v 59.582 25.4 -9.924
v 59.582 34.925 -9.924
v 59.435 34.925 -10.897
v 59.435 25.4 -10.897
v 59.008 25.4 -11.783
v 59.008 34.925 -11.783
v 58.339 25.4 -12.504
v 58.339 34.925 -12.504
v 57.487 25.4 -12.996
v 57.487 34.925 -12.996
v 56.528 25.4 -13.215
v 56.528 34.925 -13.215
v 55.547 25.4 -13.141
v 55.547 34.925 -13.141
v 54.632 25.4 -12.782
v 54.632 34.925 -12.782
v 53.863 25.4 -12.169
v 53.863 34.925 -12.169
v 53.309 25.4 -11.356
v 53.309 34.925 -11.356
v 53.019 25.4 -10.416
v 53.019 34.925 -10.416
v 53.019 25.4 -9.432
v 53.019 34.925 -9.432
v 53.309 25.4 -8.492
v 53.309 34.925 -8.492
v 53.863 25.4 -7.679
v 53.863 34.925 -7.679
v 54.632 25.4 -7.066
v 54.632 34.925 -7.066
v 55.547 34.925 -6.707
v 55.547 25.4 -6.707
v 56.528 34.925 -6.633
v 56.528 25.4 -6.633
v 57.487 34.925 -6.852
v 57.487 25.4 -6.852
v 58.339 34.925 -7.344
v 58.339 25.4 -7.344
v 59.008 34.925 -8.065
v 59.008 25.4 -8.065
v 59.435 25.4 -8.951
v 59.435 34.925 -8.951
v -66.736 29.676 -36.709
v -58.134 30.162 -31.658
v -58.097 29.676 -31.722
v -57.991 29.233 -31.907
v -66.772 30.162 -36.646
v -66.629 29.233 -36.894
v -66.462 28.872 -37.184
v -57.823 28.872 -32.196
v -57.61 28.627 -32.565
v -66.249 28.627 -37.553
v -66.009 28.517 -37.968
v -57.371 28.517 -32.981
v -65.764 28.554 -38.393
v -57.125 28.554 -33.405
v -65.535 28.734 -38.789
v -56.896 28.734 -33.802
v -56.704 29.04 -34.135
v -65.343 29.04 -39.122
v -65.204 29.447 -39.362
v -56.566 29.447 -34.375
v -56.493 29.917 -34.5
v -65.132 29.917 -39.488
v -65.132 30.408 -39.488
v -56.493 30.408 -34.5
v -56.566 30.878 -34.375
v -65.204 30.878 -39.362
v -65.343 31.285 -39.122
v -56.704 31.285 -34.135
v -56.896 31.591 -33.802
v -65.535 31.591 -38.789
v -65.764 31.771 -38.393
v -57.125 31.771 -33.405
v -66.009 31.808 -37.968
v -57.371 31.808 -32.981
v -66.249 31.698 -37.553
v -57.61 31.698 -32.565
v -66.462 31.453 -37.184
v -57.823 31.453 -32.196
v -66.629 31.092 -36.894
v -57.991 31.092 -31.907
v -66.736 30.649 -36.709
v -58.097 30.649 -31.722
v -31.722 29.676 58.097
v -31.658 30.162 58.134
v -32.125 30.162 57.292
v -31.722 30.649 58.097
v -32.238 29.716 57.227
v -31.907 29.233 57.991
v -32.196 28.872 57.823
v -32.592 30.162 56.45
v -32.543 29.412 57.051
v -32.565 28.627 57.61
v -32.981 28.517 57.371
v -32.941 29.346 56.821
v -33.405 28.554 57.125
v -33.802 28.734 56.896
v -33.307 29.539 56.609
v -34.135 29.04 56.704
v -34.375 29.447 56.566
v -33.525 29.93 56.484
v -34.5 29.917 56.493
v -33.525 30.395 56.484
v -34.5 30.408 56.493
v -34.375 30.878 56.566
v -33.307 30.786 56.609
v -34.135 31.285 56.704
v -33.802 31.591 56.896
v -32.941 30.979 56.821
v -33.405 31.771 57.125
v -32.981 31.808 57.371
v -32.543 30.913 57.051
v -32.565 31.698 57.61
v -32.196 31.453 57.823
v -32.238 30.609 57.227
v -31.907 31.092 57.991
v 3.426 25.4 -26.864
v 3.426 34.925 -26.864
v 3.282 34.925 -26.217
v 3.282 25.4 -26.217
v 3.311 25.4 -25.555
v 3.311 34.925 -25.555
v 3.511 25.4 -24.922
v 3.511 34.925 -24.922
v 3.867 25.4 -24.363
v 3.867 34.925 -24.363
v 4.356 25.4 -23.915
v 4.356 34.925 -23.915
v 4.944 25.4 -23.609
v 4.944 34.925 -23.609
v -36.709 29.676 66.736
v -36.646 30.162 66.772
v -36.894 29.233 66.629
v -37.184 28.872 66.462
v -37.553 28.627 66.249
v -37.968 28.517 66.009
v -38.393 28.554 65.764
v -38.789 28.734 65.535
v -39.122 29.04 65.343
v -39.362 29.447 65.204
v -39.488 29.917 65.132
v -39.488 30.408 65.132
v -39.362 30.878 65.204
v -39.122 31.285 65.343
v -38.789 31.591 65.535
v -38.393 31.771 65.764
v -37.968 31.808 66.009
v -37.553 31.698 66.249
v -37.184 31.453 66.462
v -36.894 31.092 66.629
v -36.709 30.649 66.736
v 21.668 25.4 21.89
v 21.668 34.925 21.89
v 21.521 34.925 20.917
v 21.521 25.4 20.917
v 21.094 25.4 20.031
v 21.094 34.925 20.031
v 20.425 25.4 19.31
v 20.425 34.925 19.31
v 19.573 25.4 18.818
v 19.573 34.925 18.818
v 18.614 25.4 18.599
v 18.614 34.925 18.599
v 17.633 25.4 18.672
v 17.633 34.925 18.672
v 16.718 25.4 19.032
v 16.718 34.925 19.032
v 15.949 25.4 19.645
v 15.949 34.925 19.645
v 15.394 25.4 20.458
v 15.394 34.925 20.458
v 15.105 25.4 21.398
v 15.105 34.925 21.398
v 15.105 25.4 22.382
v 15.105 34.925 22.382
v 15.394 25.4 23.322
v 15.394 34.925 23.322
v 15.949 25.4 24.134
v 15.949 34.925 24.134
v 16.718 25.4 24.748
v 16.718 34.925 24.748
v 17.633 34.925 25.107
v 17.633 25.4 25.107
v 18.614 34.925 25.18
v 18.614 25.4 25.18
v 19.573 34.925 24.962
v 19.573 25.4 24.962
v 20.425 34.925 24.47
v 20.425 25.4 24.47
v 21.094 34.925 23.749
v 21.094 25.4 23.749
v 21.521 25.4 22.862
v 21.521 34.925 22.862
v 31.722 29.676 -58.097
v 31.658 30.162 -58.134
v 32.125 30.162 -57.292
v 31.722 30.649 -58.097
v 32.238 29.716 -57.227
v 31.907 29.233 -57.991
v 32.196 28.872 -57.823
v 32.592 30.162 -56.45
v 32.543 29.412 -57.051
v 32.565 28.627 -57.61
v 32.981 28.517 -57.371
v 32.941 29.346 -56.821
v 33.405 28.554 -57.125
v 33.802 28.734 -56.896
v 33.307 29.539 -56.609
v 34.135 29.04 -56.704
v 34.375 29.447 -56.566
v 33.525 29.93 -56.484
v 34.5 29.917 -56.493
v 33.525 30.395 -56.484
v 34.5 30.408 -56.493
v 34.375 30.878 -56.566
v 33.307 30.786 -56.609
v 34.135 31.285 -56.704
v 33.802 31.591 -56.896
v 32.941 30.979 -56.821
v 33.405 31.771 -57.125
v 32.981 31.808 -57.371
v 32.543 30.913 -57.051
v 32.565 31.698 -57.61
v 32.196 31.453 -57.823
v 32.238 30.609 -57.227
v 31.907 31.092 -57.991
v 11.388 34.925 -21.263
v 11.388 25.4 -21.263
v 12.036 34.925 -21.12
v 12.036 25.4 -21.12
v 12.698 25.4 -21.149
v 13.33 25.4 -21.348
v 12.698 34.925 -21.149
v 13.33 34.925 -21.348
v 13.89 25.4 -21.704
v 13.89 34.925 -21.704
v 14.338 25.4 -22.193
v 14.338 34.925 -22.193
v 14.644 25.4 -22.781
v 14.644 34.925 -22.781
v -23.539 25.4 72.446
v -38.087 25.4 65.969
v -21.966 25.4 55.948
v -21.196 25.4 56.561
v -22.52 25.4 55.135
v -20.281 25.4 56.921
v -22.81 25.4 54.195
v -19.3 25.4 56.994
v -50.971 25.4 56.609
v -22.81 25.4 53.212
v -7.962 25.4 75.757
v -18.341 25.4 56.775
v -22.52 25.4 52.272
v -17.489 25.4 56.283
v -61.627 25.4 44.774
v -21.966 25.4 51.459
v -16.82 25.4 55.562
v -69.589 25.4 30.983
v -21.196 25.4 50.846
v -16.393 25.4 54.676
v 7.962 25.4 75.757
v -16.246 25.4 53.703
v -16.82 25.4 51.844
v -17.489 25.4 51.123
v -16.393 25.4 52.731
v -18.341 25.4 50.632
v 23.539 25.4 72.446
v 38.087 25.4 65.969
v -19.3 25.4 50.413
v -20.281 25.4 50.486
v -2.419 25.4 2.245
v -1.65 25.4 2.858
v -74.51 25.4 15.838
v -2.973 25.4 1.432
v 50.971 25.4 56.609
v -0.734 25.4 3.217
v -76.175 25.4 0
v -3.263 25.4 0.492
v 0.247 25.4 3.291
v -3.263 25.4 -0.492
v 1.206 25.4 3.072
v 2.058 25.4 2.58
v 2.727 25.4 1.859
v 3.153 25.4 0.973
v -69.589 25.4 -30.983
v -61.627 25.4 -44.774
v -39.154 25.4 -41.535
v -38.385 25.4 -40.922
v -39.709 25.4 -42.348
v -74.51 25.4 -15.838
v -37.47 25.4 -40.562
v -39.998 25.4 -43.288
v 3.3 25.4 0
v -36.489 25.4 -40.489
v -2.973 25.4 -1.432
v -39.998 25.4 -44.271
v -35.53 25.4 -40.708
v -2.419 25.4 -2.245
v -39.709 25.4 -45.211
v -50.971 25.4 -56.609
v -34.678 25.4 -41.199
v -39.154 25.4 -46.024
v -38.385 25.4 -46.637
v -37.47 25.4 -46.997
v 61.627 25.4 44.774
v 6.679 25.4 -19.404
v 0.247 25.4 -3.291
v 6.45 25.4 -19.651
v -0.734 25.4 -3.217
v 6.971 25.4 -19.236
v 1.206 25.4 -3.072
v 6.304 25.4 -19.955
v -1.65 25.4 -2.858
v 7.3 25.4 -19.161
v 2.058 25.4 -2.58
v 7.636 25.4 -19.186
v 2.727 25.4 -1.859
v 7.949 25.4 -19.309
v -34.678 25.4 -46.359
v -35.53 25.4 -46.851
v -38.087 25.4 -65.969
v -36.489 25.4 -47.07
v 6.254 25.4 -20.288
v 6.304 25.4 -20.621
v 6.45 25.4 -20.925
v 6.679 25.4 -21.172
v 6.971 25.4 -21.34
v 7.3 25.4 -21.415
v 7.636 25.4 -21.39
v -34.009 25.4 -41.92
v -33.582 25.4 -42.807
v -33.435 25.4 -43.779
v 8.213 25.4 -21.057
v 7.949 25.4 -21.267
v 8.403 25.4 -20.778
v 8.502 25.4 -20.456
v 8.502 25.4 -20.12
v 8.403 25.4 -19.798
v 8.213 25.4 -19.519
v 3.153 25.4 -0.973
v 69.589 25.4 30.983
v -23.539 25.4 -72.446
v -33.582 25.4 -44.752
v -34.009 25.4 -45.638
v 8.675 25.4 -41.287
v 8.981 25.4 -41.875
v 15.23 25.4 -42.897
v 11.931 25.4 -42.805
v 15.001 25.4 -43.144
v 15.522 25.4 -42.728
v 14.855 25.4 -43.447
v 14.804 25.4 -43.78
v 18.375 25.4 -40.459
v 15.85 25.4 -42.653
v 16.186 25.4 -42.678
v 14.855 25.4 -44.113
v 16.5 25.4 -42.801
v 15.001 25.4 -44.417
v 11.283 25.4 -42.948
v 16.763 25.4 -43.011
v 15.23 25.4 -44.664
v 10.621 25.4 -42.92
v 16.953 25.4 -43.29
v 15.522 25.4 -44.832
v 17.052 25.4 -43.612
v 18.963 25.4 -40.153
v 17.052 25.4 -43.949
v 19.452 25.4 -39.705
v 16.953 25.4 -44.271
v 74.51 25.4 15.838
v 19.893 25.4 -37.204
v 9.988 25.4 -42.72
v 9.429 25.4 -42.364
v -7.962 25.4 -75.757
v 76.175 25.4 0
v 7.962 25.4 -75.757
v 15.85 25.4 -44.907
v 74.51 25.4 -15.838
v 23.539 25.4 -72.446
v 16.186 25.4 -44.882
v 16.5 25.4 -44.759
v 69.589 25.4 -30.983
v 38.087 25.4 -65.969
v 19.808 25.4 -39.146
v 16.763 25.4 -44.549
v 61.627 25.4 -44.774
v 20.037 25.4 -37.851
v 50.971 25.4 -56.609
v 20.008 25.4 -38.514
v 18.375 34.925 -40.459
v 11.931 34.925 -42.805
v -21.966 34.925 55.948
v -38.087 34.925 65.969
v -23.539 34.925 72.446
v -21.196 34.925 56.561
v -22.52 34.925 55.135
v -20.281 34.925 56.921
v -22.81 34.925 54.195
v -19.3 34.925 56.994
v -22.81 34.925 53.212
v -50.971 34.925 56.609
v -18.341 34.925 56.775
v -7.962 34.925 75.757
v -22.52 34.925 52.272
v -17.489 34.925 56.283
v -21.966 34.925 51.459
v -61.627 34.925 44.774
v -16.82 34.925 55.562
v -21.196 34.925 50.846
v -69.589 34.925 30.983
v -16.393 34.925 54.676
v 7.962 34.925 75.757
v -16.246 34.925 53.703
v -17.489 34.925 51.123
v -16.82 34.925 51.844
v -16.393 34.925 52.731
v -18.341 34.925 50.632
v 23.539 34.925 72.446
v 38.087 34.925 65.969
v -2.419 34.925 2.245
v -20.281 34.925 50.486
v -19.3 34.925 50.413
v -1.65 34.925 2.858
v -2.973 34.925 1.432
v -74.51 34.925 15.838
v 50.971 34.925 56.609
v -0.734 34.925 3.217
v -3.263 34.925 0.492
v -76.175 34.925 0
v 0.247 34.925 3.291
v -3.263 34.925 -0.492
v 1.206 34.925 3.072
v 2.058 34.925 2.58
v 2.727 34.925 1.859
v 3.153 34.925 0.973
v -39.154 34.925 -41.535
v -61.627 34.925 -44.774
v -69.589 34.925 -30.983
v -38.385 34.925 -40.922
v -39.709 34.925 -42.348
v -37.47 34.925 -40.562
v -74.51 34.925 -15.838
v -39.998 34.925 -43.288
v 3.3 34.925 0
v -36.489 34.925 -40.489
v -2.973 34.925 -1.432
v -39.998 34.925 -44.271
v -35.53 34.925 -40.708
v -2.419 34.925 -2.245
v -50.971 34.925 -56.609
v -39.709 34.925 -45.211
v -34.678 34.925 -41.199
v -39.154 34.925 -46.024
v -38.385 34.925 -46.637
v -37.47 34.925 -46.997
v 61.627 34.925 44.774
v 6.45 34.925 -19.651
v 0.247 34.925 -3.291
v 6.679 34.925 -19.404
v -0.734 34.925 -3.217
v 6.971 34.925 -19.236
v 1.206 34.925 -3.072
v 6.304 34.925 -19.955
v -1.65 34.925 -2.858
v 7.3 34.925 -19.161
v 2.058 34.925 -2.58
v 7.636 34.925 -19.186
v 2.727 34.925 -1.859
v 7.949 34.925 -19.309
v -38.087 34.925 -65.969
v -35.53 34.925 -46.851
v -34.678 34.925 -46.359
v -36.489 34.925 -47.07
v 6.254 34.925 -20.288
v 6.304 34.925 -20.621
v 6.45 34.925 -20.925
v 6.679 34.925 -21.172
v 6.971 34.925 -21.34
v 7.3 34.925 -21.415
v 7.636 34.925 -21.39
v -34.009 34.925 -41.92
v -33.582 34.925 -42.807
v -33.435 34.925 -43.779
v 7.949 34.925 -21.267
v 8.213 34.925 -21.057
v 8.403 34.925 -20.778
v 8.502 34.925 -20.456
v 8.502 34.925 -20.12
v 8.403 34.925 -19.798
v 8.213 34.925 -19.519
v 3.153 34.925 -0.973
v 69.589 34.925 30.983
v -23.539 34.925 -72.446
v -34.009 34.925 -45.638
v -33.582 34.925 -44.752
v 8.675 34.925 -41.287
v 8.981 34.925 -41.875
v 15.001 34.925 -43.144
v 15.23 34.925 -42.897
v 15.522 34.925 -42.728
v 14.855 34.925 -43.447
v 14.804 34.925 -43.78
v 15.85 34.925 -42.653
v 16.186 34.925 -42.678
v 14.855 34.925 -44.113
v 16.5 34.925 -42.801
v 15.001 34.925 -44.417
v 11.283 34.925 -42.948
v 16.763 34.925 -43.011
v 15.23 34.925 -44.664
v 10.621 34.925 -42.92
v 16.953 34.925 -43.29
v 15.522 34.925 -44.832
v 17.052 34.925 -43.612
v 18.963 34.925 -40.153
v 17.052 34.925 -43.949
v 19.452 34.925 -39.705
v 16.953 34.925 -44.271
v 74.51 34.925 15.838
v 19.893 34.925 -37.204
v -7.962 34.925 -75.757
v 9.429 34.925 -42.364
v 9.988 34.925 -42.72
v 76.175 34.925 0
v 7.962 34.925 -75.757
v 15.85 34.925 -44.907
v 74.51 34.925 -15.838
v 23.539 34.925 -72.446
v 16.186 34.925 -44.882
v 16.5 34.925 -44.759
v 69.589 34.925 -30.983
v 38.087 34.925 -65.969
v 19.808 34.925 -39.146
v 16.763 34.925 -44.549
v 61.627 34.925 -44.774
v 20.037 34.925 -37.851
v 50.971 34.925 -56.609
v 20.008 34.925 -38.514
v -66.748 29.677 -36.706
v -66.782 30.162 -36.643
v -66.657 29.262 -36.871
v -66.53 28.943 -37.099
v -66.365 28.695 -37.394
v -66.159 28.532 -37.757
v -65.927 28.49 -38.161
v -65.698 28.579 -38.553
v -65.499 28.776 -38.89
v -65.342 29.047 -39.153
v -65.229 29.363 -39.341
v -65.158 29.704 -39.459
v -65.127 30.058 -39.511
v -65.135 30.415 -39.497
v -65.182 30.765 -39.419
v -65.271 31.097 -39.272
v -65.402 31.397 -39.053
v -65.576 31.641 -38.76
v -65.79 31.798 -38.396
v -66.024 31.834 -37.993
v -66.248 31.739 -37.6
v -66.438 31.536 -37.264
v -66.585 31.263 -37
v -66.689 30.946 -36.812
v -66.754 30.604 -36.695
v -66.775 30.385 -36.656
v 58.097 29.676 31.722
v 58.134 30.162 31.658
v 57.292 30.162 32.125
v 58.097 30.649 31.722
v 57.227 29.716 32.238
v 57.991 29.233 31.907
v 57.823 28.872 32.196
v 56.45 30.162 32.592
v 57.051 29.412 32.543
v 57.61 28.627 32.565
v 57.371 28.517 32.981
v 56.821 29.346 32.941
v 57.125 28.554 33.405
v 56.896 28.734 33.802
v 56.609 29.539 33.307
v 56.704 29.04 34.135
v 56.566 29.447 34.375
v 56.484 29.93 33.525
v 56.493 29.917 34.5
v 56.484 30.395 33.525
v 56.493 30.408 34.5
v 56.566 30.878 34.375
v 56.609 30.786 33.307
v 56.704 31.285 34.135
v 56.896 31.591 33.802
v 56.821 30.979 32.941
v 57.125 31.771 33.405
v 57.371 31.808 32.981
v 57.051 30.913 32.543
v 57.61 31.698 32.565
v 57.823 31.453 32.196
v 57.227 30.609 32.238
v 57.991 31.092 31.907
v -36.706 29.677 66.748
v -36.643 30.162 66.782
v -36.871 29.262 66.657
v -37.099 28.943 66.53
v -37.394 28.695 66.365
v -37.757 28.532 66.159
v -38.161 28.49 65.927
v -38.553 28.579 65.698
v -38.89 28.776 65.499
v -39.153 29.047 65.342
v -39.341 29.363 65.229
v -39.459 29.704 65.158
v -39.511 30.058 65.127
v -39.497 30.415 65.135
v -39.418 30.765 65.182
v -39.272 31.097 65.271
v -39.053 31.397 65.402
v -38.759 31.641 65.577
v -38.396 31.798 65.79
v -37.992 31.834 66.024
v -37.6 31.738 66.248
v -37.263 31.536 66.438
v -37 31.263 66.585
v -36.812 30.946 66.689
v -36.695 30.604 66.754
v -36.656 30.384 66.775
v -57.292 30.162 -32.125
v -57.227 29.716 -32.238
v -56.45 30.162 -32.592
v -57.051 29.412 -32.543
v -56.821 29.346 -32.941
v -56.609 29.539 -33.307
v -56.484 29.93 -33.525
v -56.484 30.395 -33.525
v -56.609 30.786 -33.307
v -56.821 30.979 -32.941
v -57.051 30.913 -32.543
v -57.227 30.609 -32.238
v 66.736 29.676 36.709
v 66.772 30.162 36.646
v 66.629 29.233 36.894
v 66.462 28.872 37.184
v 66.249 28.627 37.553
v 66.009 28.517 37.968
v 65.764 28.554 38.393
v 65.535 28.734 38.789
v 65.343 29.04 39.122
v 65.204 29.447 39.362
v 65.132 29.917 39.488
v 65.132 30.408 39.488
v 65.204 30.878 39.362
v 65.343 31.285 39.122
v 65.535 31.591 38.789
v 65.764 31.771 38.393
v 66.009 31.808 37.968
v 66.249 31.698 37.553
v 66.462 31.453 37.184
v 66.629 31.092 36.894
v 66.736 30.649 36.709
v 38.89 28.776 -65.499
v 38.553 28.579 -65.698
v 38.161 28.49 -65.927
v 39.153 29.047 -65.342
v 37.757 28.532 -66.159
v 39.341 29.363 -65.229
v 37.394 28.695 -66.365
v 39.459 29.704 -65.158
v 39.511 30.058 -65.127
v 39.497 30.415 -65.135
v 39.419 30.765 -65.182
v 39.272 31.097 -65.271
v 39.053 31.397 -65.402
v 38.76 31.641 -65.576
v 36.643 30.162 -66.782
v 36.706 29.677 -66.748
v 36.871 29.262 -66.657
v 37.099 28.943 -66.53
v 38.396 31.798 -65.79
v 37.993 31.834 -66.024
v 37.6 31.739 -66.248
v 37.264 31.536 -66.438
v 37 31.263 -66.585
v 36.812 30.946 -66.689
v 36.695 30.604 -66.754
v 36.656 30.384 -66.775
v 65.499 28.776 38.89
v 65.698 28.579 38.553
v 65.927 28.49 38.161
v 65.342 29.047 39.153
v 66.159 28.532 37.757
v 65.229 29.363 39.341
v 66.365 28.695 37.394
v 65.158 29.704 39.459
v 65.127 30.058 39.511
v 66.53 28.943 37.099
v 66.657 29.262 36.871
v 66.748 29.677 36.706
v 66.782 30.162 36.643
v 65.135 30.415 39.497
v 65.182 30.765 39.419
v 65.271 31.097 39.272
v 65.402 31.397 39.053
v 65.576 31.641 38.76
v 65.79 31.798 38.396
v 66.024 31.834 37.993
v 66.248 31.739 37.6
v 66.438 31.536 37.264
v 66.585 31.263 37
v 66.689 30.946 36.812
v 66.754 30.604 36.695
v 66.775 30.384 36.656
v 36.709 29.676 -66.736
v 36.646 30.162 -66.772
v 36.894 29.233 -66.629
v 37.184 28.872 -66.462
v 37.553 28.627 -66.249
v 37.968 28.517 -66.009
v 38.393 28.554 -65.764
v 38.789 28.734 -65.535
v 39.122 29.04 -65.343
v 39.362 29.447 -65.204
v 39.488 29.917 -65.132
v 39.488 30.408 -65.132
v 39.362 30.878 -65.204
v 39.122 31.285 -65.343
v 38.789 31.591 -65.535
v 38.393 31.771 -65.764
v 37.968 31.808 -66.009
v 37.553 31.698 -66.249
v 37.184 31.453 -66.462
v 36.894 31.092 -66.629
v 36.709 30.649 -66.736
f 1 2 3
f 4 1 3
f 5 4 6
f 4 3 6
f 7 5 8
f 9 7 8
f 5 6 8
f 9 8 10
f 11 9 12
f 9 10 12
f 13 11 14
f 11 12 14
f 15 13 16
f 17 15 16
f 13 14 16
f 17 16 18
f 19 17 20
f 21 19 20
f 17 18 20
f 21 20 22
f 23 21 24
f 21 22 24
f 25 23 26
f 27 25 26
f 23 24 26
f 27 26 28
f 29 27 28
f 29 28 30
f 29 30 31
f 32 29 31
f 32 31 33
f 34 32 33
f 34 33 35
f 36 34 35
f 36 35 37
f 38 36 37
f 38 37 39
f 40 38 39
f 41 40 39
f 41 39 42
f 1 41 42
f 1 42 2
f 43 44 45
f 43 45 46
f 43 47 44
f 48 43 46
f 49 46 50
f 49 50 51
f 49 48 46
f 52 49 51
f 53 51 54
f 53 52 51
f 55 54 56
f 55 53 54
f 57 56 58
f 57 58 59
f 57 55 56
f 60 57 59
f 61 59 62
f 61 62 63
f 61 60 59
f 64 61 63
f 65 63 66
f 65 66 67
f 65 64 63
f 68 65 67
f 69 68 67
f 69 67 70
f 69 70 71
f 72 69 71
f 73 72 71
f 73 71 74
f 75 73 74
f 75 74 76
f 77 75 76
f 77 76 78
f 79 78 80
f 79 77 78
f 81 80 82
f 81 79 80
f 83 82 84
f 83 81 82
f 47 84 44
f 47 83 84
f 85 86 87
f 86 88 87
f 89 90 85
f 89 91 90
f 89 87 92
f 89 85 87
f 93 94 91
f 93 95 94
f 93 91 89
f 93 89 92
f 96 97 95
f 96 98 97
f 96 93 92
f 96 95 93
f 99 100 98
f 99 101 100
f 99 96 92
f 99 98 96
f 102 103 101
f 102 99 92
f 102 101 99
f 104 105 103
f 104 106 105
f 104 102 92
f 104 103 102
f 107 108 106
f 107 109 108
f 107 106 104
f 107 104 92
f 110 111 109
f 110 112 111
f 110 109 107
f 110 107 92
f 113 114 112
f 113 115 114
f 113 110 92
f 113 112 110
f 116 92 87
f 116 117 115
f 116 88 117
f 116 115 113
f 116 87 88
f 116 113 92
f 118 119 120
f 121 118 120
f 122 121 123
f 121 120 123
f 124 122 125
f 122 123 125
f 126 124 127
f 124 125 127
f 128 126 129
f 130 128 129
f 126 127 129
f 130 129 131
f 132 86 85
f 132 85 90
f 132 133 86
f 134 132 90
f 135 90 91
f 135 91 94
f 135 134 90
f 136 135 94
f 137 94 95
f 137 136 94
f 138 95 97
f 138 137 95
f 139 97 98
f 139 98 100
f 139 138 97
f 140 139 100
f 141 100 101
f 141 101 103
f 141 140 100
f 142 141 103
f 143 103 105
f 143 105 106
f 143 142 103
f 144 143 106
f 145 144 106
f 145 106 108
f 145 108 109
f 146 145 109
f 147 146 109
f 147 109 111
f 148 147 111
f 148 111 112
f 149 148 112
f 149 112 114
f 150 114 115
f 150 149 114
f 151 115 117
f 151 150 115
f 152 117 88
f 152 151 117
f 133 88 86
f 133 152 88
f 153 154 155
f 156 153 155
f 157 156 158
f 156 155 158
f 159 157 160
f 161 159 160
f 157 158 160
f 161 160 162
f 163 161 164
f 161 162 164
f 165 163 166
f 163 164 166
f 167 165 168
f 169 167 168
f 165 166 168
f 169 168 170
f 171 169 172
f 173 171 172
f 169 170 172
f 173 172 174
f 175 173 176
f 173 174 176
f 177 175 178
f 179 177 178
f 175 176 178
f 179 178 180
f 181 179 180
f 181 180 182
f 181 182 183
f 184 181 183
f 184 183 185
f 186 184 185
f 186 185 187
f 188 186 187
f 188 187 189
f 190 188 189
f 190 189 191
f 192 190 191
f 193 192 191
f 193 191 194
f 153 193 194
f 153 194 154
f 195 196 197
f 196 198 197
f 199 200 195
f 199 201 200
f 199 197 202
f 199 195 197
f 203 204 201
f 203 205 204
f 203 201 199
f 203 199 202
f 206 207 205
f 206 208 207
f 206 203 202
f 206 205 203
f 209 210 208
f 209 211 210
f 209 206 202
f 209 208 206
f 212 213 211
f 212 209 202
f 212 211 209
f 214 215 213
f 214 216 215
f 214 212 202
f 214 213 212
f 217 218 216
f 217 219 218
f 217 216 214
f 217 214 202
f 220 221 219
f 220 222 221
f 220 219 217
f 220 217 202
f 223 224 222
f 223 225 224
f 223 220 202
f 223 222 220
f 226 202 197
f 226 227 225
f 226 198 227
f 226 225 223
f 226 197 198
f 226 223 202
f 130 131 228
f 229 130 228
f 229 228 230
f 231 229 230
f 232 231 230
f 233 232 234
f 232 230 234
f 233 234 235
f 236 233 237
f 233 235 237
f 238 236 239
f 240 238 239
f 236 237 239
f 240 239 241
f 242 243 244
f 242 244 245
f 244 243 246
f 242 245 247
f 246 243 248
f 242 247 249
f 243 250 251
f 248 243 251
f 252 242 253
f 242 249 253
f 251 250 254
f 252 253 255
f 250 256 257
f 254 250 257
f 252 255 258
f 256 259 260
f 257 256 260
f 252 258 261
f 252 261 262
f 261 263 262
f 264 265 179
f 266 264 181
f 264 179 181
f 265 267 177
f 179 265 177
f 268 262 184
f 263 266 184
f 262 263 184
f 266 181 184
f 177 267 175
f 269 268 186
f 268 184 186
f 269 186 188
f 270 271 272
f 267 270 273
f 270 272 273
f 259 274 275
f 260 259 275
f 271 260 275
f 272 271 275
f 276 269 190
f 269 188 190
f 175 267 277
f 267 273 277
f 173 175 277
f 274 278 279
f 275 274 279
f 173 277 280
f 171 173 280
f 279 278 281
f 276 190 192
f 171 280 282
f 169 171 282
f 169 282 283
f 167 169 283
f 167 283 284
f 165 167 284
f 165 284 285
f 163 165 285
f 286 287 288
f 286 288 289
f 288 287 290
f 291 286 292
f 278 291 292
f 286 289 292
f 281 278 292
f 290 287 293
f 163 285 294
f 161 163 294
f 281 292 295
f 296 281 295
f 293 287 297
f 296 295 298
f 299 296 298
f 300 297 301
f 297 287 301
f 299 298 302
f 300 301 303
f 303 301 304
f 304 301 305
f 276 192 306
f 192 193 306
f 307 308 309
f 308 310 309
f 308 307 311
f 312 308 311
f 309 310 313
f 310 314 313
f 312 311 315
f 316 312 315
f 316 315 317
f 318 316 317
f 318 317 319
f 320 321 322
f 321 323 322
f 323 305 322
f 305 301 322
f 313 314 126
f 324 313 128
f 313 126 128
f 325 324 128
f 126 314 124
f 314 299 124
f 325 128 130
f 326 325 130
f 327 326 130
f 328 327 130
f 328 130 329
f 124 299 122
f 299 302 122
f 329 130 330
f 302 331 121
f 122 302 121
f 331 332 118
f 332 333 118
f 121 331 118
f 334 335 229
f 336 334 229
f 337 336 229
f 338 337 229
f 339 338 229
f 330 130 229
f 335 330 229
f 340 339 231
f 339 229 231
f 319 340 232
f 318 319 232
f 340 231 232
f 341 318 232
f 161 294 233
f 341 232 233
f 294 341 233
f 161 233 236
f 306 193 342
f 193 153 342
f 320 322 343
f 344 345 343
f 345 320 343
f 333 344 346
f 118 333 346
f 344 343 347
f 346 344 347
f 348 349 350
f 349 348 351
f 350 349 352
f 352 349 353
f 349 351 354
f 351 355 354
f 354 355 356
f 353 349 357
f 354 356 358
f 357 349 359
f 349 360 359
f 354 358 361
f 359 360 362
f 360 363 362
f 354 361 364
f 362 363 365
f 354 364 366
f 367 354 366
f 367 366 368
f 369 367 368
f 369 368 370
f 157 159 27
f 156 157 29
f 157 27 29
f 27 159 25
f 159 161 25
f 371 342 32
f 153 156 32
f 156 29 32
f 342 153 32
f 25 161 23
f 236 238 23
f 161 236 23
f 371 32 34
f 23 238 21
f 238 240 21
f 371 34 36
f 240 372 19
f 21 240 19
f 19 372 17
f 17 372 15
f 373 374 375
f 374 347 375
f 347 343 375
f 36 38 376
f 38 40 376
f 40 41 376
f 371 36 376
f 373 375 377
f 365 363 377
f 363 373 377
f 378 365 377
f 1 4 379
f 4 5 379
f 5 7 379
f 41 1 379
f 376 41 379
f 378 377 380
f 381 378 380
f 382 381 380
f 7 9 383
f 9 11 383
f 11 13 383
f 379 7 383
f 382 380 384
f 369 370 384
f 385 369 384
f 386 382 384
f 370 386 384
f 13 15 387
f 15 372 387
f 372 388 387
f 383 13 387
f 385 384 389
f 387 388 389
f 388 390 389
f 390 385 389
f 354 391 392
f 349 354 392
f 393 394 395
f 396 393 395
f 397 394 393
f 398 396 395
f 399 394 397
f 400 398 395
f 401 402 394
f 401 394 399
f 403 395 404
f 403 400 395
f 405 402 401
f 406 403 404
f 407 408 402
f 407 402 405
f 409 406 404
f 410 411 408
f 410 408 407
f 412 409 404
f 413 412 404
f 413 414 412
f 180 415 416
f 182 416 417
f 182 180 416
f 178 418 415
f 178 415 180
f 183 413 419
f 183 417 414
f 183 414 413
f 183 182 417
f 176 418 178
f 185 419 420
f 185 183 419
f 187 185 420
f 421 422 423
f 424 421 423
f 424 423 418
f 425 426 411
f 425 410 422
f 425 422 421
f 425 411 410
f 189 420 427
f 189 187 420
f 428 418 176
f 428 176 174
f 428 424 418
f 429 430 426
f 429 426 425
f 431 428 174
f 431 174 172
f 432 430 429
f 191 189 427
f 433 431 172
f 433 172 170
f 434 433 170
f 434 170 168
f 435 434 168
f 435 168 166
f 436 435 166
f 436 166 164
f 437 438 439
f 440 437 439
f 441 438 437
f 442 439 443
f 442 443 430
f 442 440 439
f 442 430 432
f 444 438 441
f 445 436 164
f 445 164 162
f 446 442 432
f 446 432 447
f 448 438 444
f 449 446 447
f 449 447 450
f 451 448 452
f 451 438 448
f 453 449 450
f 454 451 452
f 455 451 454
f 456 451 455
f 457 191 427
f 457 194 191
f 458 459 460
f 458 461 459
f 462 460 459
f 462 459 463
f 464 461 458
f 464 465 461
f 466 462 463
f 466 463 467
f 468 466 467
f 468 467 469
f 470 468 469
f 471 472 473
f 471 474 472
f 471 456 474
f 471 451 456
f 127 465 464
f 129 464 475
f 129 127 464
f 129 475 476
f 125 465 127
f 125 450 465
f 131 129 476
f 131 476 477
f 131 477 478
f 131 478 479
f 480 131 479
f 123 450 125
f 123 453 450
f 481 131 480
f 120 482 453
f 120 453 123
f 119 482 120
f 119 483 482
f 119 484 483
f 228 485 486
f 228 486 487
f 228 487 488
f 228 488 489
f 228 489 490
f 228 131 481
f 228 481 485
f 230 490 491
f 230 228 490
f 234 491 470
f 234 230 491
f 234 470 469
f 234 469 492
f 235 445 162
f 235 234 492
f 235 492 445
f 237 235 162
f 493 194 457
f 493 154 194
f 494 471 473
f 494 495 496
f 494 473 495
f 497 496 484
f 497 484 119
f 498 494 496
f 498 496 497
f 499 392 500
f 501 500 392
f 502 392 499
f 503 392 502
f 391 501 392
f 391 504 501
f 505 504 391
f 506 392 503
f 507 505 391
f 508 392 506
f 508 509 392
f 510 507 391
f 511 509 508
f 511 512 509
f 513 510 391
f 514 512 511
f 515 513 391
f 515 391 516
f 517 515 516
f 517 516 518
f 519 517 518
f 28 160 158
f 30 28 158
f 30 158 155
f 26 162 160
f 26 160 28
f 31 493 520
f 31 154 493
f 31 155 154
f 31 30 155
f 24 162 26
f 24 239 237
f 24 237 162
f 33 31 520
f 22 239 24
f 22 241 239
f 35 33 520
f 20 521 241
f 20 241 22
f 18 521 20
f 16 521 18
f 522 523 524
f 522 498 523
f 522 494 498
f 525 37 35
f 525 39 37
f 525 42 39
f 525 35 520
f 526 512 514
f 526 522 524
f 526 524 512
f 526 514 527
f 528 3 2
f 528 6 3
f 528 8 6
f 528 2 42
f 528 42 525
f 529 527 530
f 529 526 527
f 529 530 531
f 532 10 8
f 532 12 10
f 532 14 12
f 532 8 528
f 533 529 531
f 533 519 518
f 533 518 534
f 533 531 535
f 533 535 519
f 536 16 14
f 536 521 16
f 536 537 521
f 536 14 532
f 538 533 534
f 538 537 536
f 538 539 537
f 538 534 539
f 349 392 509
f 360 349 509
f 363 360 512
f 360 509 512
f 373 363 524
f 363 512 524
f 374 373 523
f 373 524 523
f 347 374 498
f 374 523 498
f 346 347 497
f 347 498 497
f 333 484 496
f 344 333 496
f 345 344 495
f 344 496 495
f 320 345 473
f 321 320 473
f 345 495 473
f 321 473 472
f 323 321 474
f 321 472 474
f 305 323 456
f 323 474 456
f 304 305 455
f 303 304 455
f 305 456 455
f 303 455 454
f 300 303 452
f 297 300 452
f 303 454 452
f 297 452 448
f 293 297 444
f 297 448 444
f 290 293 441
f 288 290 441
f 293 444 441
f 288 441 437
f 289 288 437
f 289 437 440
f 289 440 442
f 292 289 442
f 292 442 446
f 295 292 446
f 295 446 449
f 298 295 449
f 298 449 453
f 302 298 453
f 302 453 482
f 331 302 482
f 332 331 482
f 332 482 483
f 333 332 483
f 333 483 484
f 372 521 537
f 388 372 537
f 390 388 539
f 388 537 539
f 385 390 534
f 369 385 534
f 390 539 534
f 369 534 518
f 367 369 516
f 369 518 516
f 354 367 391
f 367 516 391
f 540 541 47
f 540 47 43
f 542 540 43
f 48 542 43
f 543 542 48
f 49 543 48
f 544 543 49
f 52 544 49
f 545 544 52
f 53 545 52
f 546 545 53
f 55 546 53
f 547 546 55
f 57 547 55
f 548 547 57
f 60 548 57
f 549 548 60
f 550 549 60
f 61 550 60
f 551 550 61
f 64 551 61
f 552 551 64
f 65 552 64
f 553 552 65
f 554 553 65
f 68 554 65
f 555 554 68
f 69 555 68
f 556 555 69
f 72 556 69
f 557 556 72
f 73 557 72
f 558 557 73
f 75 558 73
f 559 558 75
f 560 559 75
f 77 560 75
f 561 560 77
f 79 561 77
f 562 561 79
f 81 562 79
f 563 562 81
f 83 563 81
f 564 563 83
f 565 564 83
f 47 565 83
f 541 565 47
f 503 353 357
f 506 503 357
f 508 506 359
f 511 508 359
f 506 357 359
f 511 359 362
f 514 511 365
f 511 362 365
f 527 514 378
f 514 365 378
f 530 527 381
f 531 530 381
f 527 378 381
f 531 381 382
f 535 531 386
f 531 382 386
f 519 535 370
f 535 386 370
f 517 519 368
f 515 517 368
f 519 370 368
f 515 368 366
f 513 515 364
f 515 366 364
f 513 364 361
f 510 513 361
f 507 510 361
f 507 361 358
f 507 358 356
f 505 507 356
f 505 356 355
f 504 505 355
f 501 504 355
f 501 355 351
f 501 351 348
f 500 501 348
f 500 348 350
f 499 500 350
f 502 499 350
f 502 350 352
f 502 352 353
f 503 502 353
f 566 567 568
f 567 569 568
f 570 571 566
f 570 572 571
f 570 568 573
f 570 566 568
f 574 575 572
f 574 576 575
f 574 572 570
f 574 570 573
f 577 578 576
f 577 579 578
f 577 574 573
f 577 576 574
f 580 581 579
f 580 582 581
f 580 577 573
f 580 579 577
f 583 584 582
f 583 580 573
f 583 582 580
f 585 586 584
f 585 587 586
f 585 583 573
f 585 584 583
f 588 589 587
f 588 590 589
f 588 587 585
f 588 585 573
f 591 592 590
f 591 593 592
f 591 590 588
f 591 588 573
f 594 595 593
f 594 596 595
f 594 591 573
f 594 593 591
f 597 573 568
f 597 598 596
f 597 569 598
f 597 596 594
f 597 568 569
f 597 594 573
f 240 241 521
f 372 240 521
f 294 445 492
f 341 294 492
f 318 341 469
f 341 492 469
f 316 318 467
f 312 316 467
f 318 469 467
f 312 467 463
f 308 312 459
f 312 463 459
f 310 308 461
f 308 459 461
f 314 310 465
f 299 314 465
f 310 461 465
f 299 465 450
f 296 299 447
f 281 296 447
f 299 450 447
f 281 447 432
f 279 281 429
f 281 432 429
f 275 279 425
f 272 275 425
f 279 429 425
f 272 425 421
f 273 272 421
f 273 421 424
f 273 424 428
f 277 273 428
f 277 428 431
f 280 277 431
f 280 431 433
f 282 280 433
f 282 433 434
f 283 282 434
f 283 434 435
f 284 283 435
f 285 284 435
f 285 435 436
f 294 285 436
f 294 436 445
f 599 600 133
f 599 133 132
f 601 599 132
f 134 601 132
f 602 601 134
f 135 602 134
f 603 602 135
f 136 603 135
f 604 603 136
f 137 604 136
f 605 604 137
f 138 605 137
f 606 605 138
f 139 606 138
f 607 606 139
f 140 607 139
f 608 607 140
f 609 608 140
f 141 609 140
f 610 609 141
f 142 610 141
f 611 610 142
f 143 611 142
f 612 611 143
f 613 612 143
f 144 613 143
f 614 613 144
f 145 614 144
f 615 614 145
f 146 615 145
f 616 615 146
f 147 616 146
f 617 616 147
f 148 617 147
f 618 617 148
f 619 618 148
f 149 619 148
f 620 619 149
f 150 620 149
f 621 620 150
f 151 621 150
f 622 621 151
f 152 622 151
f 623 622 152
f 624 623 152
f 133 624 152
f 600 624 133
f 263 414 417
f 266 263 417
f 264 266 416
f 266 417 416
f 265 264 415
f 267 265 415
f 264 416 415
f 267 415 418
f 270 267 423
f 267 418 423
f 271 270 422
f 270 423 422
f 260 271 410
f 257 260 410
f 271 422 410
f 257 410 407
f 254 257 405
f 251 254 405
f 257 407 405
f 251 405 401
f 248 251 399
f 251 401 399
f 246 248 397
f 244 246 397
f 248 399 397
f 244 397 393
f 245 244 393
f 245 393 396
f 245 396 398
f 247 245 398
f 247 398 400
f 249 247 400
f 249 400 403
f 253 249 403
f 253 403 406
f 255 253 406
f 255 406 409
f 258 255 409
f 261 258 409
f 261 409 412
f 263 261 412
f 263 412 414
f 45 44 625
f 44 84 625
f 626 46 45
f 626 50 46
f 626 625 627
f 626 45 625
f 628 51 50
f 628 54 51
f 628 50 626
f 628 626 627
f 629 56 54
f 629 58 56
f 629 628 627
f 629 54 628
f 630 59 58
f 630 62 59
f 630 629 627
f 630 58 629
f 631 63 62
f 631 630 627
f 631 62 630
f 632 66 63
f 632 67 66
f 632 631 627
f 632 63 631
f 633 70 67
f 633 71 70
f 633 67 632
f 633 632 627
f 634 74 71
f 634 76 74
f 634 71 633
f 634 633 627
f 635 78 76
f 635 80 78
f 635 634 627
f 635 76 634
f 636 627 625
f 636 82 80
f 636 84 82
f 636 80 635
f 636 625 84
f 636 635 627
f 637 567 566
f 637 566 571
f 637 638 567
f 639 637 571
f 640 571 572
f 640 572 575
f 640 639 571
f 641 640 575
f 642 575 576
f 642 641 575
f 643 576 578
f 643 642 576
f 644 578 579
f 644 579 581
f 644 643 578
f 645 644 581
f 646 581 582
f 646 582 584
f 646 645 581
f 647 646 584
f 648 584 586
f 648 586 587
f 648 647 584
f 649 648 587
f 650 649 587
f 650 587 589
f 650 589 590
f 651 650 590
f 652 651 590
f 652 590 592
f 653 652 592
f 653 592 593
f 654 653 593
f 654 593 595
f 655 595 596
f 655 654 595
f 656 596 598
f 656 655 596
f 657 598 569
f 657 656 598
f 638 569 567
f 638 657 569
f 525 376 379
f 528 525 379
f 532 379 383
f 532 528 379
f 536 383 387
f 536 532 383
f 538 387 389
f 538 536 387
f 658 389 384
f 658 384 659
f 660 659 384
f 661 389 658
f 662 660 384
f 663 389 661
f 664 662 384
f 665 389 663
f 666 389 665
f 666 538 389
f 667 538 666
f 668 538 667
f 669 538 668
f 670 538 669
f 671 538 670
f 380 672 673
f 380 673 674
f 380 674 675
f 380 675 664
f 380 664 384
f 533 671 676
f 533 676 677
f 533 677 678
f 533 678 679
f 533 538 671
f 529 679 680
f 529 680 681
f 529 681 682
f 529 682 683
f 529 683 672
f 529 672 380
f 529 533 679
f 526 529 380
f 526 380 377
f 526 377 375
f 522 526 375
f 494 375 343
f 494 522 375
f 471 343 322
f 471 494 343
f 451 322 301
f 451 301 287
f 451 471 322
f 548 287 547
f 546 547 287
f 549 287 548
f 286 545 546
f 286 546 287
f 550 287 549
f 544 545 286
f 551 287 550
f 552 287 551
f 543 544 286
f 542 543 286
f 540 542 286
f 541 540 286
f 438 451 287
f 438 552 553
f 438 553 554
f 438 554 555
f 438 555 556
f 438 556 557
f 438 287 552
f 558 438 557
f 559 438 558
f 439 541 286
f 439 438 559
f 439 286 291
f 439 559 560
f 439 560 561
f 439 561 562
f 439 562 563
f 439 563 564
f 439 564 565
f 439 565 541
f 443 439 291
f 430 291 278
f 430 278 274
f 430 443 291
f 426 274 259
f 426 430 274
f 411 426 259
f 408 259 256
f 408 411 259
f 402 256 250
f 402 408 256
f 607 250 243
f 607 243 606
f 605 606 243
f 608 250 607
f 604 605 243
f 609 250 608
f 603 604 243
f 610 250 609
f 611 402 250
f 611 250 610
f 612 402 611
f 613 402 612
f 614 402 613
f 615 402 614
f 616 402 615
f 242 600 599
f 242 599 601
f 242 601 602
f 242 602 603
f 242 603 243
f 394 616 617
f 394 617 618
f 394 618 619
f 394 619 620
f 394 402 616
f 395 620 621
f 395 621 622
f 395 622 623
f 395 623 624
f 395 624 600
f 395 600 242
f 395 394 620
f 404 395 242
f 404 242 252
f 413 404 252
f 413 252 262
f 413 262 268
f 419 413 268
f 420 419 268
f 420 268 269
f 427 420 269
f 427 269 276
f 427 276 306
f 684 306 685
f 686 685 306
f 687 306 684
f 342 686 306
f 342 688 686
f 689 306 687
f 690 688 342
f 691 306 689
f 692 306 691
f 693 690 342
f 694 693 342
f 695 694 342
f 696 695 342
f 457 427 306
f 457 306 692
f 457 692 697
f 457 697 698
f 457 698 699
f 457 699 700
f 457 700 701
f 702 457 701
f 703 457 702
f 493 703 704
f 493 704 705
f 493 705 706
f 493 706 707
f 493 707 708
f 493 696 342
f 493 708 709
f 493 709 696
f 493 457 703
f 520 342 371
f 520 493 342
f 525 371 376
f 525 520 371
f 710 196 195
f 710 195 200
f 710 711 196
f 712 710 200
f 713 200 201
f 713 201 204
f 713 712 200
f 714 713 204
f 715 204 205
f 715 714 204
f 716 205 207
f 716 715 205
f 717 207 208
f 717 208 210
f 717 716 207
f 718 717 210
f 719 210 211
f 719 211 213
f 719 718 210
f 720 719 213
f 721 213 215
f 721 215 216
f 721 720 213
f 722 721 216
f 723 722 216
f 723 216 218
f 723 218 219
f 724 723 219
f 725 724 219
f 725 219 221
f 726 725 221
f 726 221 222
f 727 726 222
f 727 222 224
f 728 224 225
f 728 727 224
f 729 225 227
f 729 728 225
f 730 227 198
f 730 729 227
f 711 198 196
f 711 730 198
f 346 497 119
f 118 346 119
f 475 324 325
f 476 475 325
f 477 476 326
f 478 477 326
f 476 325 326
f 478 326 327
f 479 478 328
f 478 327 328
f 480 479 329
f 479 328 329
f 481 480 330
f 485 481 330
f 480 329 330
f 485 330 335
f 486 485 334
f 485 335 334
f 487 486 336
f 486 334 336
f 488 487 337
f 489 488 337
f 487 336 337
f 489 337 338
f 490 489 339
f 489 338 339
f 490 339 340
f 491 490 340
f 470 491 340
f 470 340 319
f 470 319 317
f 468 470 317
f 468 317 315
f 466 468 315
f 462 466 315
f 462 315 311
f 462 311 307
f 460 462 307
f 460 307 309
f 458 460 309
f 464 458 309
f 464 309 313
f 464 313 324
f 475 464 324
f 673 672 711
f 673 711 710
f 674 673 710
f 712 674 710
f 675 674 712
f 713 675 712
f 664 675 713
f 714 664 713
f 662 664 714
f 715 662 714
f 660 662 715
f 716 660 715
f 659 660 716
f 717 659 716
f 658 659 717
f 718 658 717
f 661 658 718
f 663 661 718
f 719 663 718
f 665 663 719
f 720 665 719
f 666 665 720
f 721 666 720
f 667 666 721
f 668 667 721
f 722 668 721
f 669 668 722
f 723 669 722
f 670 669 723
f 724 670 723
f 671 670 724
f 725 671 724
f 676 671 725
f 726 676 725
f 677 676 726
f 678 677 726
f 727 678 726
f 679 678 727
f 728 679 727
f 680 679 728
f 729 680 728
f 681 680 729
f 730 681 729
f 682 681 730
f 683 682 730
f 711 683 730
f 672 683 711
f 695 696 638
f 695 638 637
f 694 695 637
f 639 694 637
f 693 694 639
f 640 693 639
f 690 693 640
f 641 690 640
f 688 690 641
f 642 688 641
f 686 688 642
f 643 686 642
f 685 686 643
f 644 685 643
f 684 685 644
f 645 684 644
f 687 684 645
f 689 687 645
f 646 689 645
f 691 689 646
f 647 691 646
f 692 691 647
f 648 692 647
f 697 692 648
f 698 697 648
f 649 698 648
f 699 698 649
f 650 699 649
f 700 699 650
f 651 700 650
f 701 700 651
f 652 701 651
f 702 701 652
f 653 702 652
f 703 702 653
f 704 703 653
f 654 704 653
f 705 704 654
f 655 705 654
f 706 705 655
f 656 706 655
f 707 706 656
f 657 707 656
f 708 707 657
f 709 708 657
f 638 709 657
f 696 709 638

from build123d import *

# Parameters (mm, degrees)
SKETCH1_R                 = 78.359
BOSS_EXTRUDE1_DEPTH       = 25.4
SKETCH6_R                 = 76.1746
BOSS_EXTRUDE5_DEPTH       = 9.525
SKETCH7_R                 = 76.1746
BOSS_EXTRUDE6_DEPTH       = 9.525
SKETCH8_R                 = 73.025
CUT_EXTRUDE5_DEPTH        = 34.925
CUT_EXTRUDE3_START        = 25.4
SKETCH1_7_R               = 78.359
SKETCH1_7_R_2             = 76.1746
CUT_EXTRUDE3_DEPTH        = 9.525
CIRPATTERN2_COUNT         = 3
SKETCH4_R                 = 73.025
BOSS_EXTRUDE4_DEPTH       = 9.525
SKETCH9_R                 = 3.3
CUT_EXTRUDE6_DEPTH        = 45.45
SKETCH10_R                = 82.322787435
CUT_EXTRUDE7_DEPTH        = 35.925
TAP_DRILL_FOR_4_40_TAP1_D = 2.2606
CUT_EXTRUDE9_DEPTH        = 10.525
CIRPATTERN3_COUNT         = 4


with BuildPart() as part:
    # Sketch1 → Boss-Extrude1 (new body)
    with BuildSketch(Plane(origin=(0, 0, 0), x_dir=(1, 0, 0), z_dir=(0, 1, 0))):
        Circle(SKETCH1_R)
    extrude(amount=BOSS_EXTRUDE1_DEPTH)

    # Sketch6 → Boss-Extrude5 (add)
    with BuildSketch(Plane(origin=(0, 25.4, 0), x_dir=(1, 0, 0), z_dir=(0, 1, 0))):
        Circle(SKETCH6_R)
    extrude(amount=BOSS_EXTRUDE5_DEPTH)

    # Sketch7 → Boss-Extrude6 (add)
    with BuildSketch(Plane.XZ):
        Circle(SKETCH7_R)
    extrude(amount=BOSS_EXTRUDE6_DEPTH)

    # Sketch8 → Cut-Extrude5 (cut)
    with BuildSketch(Plane.XZ.offset(9.525)):
        Circle(SKETCH8_R)
    extrude(amount=-CUT_EXTRUDE5_DEPTH, mode=Mode.SUBTRACT)

    # Sketch1_7 → Cut-Extrude3 (cut)
    with BuildSketch(Plane(origin=(0, 0, 0), x_dir=(1, 0, 0), z_dir=(0, 1, 0)).offset(CUT_EXTRUDE3_START)):
        Circle(SKETCH1_7_R)
        Circle(SKETCH1_7_R_2, mode=Mode.SUBTRACT)
    cut_extrude3 = extrude(amount=-CUT_EXTRUDE3_DEPTH, mode=Mode.SUBTRACT)

    # CirPattern2: Cut-Extrude3 ×3 about axis
    cirpattern2_axis = Axis((0, 0, 0), (0, 1, 0))
    for i in range(1, CIRPATTERN2_COUNT):
        add(cut_extrude3.rotate(cirpattern2_axis, i * 360 / CIRPATTERN2_COUNT), mode=Mode.SUBTRACT)

    # Sketch4 → Boss-Extrude4 (add)
    with BuildSketch(Plane(origin=(0, 34.925, 0), x_dir=(1, 0, 0), z_dir=(0, 1, 0))):
        Circle(SKETCH4_R)
    extrude(amount=-BOSS_EXTRUDE4_DEPTH)

    # Sketch9 → Cut-Extrude6 (cut, through all)
    with BuildSketch(Plane(origin=(0, 34.925, 0), x_dir=(1, 0, 0), z_dir=(0, 1, 0))):
        Circle(SKETCH9_R)
        with Locations((-19.546451191, -53.703433278)):
            Circle(SKETCH9_R)
        with Locations((-36.735311894, 43.779439924)):
            Circle(SKETCH9_R)
        with Locations((56.281763085, 9.923993354)):
            Circle(SKETCH9_R)
        with Locations((18.367655947, -21.889719962)):
            Circle(SKETCH9_R)
    extrude(amount=-CUT_EXTRUDE6_DEPTH, mode=Mode.SUBTRACT)

    # Sketch10 → Cut-Extrude7 (cut, through all)
    with BuildSketch(Plane(origin=(0, 25.4, 0), x_dir=(1, 0, 0), z_dir=(0, 1, 0))):
        Circle(SKETCH10_R)
    extrude(amount=-CUT_EXTRUDE7_DEPTH, mode=Mode.SUBTRACT)

    # Tap Drill for _4-40 Tap1 (through all)
    with Locations(Plane(origin=(0, 34.925, 0), x_dir=(1, 0, 0), z_dir=(0, 1, 0))):
        with Locations((7.384214894, 20.287963683), (15.934718491, 43.780279238)):
            Hole(TAP_DRILL_FOR_4_40_TAP1_D / 2)

    # Sketch14 → Cut-Extrude9 (cut, through all)
    with BuildSketch(Plane(origin=(0, 34.925, 0), x_dir=(1, 0, 0), z_dir=(0, 1, 0))):
        with BuildLine():
            Line((14.64382936, 22.781402035), (19.893154532, 37.203804415))
            ThreePointArc((19.893154532, 37.203804415), (19.808357055, 39.145985964), (18.37506644, 40.459354836))
            Line((18.37506644, 40.459354836), (11.930654446, 42.804928978))
            ThreePointArc((11.930654446, 42.804928978), (9.988472897, 42.720131501), (8.675104025, 41.286840886))
            Line((8.675104025, 41.286840886), (3.425778853, 26.864438506))
            ThreePointArc((3.425778853, 26.864438506), (3.51057633, 24.922256957), (4.943866945, 23.608888085))
            Line((4.943866945, 23.608888085), (11.388278939, 21.263313942))
            ThreePointArc((11.388278939, 21.263313942), (13.330460488, 21.34811142), (14.64382936, 22.781402035))
        make_face()
    extrude(amount=-CUT_EXTRUDE9_DEPTH, mode=Mode.SUBTRACT)

    # Sketch19 → Tap Drill for M4x0.7 Tap1 (revolve, cut)
    with BuildSketch(Plane(origin=(-38.0873, 30.1625, 65.969138723), x_dir=(0.866025404, 0, 0.5), z_dir=(0, 1, 0))):
        Polygon((0, 0), (0, 10.991425421), (1.65, 10.0000054), (1.65, 0.025), (1.675, 0), align=None)
    tap_drill_for_m4x0_7_tap1 = revolve(axis=Axis((-41.2623, 30.1625, 71.468400037), (0.5, 0, -0.866025404)), mode=Mode.SUBTRACT)

    # CirPattern3: Tap Drill for M4x0.7 Tap1 ×4 about axis
    cirpattern3_axis = Axis((0, 34.925, 0), (0, 1, 0))
    for i in range(1, CIRPATTERN3_COUNT):
        add(tap_drill_for_m4x0_7_tap1.rotate(cirpattern3_axis, i * 360 / CIRPATTERN3_COUNT), mode=Mode.SUBTRACT)


solid = part.part
